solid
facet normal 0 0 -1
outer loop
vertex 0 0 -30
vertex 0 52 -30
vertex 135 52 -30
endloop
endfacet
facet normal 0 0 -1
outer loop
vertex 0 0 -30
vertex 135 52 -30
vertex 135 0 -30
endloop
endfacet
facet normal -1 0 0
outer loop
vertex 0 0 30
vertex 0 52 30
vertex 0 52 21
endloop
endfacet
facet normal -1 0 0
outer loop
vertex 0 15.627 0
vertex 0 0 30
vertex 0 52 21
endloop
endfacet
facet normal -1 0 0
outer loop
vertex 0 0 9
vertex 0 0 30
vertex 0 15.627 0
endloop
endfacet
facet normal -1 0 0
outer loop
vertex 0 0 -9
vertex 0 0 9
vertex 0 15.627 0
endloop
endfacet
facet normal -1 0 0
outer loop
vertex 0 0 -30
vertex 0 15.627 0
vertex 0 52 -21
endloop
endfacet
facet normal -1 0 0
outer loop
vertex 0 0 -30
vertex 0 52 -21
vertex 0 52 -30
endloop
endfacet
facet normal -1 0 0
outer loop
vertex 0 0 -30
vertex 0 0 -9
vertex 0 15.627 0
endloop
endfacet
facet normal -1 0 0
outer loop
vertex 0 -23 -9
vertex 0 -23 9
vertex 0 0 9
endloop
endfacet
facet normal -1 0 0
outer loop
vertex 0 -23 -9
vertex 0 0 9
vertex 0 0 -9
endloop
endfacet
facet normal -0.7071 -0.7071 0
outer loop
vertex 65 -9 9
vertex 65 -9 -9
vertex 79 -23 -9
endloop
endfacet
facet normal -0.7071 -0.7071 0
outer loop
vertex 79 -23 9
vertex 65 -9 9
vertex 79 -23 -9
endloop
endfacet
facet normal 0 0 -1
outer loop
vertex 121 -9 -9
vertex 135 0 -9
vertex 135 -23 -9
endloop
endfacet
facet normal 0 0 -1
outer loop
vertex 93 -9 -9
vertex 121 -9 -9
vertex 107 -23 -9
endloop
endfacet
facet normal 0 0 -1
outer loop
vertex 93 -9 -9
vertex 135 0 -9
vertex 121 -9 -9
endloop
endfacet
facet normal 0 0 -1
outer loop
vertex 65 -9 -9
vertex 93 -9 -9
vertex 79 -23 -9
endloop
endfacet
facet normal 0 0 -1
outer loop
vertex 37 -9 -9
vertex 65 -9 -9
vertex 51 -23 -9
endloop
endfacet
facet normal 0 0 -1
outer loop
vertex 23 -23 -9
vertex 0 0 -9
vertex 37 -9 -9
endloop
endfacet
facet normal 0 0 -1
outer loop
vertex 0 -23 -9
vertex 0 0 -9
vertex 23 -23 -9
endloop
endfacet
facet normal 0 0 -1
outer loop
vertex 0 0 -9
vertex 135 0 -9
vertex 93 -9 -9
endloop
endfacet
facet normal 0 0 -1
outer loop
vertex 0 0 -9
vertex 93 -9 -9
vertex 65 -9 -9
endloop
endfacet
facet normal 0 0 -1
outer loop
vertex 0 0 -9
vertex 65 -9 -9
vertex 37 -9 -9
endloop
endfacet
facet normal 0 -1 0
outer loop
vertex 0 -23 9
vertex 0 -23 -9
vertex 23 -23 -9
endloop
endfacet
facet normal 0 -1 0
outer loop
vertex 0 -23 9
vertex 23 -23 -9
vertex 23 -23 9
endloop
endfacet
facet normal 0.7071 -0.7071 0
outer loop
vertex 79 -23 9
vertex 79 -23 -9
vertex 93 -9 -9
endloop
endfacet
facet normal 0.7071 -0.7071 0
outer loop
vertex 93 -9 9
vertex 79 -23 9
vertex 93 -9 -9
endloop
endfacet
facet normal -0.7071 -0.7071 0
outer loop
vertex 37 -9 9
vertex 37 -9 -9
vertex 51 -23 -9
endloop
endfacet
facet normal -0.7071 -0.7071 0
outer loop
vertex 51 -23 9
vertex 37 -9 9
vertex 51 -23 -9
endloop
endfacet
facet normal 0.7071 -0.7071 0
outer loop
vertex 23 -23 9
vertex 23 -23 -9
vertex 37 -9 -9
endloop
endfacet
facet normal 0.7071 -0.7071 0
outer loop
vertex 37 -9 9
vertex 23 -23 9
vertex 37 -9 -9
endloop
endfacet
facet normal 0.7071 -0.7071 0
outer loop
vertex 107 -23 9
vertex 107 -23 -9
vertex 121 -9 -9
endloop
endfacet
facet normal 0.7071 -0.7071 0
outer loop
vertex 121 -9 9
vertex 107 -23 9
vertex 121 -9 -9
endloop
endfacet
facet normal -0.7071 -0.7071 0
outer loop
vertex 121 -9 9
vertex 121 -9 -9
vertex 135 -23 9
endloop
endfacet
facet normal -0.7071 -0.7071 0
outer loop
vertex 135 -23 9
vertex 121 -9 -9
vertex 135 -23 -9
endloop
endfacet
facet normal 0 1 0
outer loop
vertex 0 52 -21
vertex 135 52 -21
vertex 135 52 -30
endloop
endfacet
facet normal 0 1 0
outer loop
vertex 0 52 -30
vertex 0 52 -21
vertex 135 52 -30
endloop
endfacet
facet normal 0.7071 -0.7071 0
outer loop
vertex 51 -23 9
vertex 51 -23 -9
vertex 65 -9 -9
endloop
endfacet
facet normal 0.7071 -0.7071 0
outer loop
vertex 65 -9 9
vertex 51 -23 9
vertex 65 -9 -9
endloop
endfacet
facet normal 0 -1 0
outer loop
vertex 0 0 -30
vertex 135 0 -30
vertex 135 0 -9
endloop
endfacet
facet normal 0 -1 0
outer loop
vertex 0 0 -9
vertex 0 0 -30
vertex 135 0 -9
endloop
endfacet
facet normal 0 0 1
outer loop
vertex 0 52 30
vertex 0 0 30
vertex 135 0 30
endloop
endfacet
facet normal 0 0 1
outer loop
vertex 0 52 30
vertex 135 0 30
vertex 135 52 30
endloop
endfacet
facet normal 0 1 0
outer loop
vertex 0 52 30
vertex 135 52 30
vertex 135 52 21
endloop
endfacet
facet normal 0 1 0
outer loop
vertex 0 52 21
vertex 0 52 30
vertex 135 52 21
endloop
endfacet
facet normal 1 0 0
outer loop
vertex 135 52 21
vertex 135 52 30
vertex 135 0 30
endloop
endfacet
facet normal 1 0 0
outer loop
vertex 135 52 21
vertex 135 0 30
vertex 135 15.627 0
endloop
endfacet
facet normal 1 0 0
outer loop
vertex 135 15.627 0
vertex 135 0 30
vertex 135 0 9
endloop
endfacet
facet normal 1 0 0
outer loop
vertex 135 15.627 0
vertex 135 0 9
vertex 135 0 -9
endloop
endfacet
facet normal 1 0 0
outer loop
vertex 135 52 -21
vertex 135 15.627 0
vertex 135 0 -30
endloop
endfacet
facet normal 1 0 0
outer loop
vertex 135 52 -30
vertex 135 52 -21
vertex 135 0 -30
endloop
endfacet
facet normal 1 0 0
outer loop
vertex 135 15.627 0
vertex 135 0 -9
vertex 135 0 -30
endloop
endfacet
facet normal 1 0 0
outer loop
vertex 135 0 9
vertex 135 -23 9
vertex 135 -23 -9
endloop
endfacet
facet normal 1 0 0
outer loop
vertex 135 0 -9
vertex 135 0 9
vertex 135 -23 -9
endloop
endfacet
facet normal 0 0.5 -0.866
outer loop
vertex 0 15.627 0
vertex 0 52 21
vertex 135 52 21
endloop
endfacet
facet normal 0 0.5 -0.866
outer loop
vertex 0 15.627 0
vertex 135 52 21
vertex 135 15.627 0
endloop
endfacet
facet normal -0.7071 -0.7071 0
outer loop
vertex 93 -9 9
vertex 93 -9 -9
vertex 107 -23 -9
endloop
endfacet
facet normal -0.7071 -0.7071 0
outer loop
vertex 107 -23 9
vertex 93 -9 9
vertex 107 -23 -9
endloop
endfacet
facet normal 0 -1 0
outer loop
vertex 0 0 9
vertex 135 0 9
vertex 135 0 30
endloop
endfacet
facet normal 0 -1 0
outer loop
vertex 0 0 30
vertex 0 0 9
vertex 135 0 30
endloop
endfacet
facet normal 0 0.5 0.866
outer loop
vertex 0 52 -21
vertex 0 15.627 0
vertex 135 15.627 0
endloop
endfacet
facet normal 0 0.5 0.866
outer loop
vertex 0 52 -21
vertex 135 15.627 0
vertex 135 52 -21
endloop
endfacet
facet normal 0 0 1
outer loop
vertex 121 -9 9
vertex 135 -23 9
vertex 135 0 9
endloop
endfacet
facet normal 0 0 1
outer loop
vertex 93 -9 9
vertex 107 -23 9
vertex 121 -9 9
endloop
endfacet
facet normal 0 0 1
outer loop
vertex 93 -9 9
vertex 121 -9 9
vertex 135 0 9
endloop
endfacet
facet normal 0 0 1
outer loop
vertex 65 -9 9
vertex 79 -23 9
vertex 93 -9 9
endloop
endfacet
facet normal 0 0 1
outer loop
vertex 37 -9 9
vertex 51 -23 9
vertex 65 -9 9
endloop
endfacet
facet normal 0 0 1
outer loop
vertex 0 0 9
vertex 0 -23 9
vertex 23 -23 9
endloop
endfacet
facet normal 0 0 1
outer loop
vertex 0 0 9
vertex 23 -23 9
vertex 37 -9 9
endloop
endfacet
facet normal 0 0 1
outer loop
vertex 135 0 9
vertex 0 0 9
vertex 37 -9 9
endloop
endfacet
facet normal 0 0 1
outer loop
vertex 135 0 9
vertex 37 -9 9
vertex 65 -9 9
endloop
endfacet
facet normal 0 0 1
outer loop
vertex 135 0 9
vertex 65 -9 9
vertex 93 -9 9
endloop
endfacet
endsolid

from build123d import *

# Parameters (mm, degrees)
BOSS_EXTRUDE1_DEPTH = 135
CUT_EXTRUDE1_REACH  = 151.833


with BuildPart() as part:
    # Sketch2 → Boss-Extrude1 (new body)
    with BuildSketch(Plane(origin=(0, 0, 0), x_dir=(0, 0, 1), z_dir=(1, 0, 0))):
        Polygon((-9, 23), (9, 23), (9, 0), (30, 0), (30, -52), (21, -52), (0, -15.626933041), (-21, -52), (-30, -52), (-30, 0), (-9, 0), align=None)
    extrude(amount=BOSS_EXTRUDE1_DEPTH)

    # Sketch3 → Cut-Extrude1 (cut, up to next)
    with BuildSketch(Plane(origin=(0, 0, -9), x_dir=(-1, 0, 0), z_dir=(0, 0, -1)), mode=Mode.PRIVATE) as cut_extrude1_sk1:
        Polygon((-65, -9), (-79, -23), (-51, -23), align=None)
    cut_extrude1_tool1 = extrude(cut_extrude1_sk1.sketch, amount=-CUT_EXTRUDE1_REACH, mode=Mode.PRIVATE) & part.part
    # Sketch3 → Cut-Extrude1 (cut, up to next)
    with BuildSketch(Plane(origin=(0, 0, -9), x_dir=(-1, 0, 0), z_dir=(0, 0, -1)), mode=Mode.PRIVATE) as cut_extrude1_sk2:
        Polygon((-93, -9), (-107, -23), (-79, -23), align=None)
    cut_extrude1_tool2 = extrude(cut_extrude1_sk2.sketch, amount=-CUT_EXTRUDE1_REACH, mode=Mode.PRIVATE) & part.part
    # Sketch3 → Cut-Extrude1 (cut, up to next)
    with BuildSketch(Plane(origin=(0, 0, -9), x_dir=(-1, 0, 0), z_dir=(0, 0, -1)), mode=Mode.PRIVATE) as cut_extrude1_sk3:
        Polygon((-121, -9), (-135, -23), (-107, -23), align=None)
    cut_extrude1_tool3 = extrude(cut_extrude1_sk3.sketch, amount=-CUT_EXTRUDE1_REACH, mode=Mode.PRIVATE) & part.part
    # Sketch3 → Cut-Extrude1 (cut, up to next)
    with BuildSketch(Plane(origin=(0, 0, -9), x_dir=(-1, 0, 0), z_dir=(0, 0, -1)), mode=Mode.PRIVATE) as cut_extrude1_sk4:
        Polygon((-37, -9), (-51, -23), (-23, -23), align=None)
    cut_extrude1_tool4 = extrude(cut_extrude1_sk4.sketch, amount=-CUT_EXTRUDE1_REACH, mode=Mode.PRIVATE) & part.part
    add(cut_extrude1_tool1.solids().sort_by_distance((65, -18.333333, -9))[0], mode=Mode.SUBTRACT)
    add(cut_extrude1_tool2.solids().sort_by_distance((93, -18.333333, -9))[0], mode=Mode.SUBTRACT)
    add(cut_extrude1_tool3.solids().sort_by_distance((121, -18.333333, -9))[0], mode=Mode.SUBTRACT)
    add(cut_extrude1_tool4.solids().sort_by_distance((37, -18.333333, -9))[0], mode=Mode.SUBTRACT)


solid = part.part
